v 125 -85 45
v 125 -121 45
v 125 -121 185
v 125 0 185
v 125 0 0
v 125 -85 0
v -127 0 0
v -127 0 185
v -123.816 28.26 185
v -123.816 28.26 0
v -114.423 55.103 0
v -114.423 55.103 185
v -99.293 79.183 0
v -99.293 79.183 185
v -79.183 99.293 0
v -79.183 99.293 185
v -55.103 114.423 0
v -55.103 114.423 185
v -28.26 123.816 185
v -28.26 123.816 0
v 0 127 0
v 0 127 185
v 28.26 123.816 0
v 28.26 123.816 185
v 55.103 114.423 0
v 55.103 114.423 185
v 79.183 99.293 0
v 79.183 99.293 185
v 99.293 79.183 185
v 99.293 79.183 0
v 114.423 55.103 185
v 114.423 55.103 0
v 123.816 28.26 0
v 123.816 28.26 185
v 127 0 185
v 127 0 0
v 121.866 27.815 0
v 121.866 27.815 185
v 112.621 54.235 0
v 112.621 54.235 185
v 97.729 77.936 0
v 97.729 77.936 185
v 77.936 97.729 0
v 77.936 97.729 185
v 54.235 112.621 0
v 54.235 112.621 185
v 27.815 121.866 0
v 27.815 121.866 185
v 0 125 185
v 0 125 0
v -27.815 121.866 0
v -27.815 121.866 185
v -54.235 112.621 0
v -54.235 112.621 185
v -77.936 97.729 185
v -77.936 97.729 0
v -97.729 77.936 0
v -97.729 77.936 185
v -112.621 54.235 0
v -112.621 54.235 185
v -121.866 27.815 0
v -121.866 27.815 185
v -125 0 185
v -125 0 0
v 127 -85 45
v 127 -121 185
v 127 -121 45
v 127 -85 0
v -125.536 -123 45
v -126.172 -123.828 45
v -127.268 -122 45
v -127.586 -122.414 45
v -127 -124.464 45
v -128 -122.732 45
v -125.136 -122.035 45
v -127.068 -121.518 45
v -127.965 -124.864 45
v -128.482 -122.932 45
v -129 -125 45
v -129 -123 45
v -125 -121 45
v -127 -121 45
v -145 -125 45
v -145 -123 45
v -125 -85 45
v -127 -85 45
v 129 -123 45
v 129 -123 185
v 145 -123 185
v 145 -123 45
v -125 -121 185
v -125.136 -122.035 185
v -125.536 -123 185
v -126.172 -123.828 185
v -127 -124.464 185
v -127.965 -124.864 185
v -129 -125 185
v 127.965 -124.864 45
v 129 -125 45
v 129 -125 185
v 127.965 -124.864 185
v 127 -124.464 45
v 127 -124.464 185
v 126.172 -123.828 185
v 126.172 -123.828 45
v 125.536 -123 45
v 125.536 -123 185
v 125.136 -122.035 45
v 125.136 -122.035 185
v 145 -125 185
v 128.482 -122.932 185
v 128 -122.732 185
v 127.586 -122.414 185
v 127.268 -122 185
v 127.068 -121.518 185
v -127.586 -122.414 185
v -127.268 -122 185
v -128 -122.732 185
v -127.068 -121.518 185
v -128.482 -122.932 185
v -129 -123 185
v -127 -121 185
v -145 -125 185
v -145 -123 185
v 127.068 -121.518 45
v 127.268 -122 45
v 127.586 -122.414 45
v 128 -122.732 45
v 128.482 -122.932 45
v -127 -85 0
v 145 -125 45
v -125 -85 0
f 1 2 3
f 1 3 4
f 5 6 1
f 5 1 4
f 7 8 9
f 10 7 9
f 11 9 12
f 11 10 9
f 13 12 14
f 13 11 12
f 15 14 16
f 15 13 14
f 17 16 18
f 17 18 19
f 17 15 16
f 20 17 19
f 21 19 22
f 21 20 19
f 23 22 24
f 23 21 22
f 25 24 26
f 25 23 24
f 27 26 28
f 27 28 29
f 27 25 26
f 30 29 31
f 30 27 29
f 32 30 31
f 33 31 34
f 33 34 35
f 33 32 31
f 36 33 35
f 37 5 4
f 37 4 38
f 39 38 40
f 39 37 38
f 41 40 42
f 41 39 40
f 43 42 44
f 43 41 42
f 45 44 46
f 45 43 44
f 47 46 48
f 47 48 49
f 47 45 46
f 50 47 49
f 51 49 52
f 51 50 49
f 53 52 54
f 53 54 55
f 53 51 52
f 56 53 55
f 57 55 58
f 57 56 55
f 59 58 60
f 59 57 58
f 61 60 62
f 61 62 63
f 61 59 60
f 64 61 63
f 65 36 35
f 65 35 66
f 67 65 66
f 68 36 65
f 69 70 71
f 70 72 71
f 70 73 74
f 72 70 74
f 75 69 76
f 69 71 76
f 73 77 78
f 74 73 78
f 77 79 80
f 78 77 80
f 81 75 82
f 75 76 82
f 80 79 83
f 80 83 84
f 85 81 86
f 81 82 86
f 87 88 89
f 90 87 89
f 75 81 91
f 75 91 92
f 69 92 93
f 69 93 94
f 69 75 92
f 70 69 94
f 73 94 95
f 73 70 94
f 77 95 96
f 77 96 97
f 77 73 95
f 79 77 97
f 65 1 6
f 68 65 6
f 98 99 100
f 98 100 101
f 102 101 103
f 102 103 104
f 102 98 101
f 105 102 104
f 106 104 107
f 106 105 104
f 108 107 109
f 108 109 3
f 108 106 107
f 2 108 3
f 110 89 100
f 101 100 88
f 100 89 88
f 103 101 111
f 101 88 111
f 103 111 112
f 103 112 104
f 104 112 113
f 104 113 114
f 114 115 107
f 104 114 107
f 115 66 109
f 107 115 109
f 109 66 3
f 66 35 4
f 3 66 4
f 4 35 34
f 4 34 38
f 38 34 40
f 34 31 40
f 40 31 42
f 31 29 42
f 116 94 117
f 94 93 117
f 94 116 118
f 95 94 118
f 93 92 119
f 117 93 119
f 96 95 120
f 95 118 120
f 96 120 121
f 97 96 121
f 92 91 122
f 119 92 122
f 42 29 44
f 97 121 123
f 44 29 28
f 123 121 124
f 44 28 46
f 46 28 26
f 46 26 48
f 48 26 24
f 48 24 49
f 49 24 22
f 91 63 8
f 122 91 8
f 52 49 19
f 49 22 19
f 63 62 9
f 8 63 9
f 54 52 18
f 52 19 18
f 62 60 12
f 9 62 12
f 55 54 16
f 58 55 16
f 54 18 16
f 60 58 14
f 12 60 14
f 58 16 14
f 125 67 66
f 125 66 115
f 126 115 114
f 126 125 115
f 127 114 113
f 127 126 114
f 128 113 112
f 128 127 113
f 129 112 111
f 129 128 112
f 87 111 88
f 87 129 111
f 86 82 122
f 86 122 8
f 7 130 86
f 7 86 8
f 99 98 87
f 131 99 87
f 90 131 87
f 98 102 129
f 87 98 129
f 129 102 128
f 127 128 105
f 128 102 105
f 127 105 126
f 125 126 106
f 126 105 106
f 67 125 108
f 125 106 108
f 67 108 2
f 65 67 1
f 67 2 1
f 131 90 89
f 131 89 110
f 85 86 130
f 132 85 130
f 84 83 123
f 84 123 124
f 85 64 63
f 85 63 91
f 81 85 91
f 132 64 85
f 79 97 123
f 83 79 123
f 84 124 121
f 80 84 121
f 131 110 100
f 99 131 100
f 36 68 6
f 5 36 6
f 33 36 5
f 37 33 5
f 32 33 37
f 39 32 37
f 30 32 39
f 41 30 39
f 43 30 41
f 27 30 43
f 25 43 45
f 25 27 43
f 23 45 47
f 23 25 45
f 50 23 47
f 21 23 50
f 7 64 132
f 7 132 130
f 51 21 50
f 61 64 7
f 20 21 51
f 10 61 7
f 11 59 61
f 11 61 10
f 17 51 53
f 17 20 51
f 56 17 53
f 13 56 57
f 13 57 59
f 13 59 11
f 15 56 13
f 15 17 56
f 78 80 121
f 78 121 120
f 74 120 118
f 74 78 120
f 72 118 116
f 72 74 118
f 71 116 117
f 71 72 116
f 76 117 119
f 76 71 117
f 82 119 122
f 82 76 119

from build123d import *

# Parameters (mm, degrees)
BASE_FLANGE1_DEPTH  = 185
EXTRUDE1_DEPTH      = 353.615938381
EXTRUDE1_DEPTH_BACK = 353.615938381
SKETCH10_W          = 45
SKETCH10_H          = 40


# Sheet-metal steps are written as plain solids
with BuildPart() as part:
    # Sketch1 → Base-Flange1 (new body)
    with BuildSketch(Plane.XY):
        with BuildLine():
            Line((145, -125), (129, -125))
            ThreePointArc((129, -125), (126.171572875, -123.828427125), (125, -121))
            Line((125, -121), (125, 0))
            ThreePointArc((125, 0), (0, 125), (-125, 0))
            Line((-125, 0), (-125, -121))
            ThreePointArc((-125, -121), (-126.171572875, -123.828427125), (-129, -125))
            Line((-129, -125), (-145, -125))
            Line((-145, -125), (-145, -123))
            Line((-145, -123), (-129, -123))
            ThreePointArc((-129, -123), (-127.585786438, -122.414213562), (-127, -121))
            Line((-127, -121), (-127, 0))
            ThreePointArc((-127, 0), (0, 127), (127, 0))
            Line((127, 0), (127, -121))
            ThreePointArc((127, -121), (127.585786438, -122.414213562), (129, -123))
            Line((129, -123), (145, -123))
            Line((145, -123), (145, -125))
        make_face()
    extrude(amount=BASE_FLANGE1_DEPTH)

    # Sketch10 → Extrude1 (cut, two sides: drawn at the far end of the back side and taken through both)
    with BuildSketch(Plane(origin=(127, 0, 0), x_dir=(0, 0, -1), z_dir=(1, 0, 0)).offset(-EXTRUDE1_DEPTH_BACK)):
        with Locations((-22.5, -105)):
            Rectangle(SKETCH10_W, SKETCH10_H)
    extrude(amount=EXTRUDE1_DEPTH + EXTRUDE1_DEPTH_BACK, mode=Mode.SUBTRACT)


solid = part.part
